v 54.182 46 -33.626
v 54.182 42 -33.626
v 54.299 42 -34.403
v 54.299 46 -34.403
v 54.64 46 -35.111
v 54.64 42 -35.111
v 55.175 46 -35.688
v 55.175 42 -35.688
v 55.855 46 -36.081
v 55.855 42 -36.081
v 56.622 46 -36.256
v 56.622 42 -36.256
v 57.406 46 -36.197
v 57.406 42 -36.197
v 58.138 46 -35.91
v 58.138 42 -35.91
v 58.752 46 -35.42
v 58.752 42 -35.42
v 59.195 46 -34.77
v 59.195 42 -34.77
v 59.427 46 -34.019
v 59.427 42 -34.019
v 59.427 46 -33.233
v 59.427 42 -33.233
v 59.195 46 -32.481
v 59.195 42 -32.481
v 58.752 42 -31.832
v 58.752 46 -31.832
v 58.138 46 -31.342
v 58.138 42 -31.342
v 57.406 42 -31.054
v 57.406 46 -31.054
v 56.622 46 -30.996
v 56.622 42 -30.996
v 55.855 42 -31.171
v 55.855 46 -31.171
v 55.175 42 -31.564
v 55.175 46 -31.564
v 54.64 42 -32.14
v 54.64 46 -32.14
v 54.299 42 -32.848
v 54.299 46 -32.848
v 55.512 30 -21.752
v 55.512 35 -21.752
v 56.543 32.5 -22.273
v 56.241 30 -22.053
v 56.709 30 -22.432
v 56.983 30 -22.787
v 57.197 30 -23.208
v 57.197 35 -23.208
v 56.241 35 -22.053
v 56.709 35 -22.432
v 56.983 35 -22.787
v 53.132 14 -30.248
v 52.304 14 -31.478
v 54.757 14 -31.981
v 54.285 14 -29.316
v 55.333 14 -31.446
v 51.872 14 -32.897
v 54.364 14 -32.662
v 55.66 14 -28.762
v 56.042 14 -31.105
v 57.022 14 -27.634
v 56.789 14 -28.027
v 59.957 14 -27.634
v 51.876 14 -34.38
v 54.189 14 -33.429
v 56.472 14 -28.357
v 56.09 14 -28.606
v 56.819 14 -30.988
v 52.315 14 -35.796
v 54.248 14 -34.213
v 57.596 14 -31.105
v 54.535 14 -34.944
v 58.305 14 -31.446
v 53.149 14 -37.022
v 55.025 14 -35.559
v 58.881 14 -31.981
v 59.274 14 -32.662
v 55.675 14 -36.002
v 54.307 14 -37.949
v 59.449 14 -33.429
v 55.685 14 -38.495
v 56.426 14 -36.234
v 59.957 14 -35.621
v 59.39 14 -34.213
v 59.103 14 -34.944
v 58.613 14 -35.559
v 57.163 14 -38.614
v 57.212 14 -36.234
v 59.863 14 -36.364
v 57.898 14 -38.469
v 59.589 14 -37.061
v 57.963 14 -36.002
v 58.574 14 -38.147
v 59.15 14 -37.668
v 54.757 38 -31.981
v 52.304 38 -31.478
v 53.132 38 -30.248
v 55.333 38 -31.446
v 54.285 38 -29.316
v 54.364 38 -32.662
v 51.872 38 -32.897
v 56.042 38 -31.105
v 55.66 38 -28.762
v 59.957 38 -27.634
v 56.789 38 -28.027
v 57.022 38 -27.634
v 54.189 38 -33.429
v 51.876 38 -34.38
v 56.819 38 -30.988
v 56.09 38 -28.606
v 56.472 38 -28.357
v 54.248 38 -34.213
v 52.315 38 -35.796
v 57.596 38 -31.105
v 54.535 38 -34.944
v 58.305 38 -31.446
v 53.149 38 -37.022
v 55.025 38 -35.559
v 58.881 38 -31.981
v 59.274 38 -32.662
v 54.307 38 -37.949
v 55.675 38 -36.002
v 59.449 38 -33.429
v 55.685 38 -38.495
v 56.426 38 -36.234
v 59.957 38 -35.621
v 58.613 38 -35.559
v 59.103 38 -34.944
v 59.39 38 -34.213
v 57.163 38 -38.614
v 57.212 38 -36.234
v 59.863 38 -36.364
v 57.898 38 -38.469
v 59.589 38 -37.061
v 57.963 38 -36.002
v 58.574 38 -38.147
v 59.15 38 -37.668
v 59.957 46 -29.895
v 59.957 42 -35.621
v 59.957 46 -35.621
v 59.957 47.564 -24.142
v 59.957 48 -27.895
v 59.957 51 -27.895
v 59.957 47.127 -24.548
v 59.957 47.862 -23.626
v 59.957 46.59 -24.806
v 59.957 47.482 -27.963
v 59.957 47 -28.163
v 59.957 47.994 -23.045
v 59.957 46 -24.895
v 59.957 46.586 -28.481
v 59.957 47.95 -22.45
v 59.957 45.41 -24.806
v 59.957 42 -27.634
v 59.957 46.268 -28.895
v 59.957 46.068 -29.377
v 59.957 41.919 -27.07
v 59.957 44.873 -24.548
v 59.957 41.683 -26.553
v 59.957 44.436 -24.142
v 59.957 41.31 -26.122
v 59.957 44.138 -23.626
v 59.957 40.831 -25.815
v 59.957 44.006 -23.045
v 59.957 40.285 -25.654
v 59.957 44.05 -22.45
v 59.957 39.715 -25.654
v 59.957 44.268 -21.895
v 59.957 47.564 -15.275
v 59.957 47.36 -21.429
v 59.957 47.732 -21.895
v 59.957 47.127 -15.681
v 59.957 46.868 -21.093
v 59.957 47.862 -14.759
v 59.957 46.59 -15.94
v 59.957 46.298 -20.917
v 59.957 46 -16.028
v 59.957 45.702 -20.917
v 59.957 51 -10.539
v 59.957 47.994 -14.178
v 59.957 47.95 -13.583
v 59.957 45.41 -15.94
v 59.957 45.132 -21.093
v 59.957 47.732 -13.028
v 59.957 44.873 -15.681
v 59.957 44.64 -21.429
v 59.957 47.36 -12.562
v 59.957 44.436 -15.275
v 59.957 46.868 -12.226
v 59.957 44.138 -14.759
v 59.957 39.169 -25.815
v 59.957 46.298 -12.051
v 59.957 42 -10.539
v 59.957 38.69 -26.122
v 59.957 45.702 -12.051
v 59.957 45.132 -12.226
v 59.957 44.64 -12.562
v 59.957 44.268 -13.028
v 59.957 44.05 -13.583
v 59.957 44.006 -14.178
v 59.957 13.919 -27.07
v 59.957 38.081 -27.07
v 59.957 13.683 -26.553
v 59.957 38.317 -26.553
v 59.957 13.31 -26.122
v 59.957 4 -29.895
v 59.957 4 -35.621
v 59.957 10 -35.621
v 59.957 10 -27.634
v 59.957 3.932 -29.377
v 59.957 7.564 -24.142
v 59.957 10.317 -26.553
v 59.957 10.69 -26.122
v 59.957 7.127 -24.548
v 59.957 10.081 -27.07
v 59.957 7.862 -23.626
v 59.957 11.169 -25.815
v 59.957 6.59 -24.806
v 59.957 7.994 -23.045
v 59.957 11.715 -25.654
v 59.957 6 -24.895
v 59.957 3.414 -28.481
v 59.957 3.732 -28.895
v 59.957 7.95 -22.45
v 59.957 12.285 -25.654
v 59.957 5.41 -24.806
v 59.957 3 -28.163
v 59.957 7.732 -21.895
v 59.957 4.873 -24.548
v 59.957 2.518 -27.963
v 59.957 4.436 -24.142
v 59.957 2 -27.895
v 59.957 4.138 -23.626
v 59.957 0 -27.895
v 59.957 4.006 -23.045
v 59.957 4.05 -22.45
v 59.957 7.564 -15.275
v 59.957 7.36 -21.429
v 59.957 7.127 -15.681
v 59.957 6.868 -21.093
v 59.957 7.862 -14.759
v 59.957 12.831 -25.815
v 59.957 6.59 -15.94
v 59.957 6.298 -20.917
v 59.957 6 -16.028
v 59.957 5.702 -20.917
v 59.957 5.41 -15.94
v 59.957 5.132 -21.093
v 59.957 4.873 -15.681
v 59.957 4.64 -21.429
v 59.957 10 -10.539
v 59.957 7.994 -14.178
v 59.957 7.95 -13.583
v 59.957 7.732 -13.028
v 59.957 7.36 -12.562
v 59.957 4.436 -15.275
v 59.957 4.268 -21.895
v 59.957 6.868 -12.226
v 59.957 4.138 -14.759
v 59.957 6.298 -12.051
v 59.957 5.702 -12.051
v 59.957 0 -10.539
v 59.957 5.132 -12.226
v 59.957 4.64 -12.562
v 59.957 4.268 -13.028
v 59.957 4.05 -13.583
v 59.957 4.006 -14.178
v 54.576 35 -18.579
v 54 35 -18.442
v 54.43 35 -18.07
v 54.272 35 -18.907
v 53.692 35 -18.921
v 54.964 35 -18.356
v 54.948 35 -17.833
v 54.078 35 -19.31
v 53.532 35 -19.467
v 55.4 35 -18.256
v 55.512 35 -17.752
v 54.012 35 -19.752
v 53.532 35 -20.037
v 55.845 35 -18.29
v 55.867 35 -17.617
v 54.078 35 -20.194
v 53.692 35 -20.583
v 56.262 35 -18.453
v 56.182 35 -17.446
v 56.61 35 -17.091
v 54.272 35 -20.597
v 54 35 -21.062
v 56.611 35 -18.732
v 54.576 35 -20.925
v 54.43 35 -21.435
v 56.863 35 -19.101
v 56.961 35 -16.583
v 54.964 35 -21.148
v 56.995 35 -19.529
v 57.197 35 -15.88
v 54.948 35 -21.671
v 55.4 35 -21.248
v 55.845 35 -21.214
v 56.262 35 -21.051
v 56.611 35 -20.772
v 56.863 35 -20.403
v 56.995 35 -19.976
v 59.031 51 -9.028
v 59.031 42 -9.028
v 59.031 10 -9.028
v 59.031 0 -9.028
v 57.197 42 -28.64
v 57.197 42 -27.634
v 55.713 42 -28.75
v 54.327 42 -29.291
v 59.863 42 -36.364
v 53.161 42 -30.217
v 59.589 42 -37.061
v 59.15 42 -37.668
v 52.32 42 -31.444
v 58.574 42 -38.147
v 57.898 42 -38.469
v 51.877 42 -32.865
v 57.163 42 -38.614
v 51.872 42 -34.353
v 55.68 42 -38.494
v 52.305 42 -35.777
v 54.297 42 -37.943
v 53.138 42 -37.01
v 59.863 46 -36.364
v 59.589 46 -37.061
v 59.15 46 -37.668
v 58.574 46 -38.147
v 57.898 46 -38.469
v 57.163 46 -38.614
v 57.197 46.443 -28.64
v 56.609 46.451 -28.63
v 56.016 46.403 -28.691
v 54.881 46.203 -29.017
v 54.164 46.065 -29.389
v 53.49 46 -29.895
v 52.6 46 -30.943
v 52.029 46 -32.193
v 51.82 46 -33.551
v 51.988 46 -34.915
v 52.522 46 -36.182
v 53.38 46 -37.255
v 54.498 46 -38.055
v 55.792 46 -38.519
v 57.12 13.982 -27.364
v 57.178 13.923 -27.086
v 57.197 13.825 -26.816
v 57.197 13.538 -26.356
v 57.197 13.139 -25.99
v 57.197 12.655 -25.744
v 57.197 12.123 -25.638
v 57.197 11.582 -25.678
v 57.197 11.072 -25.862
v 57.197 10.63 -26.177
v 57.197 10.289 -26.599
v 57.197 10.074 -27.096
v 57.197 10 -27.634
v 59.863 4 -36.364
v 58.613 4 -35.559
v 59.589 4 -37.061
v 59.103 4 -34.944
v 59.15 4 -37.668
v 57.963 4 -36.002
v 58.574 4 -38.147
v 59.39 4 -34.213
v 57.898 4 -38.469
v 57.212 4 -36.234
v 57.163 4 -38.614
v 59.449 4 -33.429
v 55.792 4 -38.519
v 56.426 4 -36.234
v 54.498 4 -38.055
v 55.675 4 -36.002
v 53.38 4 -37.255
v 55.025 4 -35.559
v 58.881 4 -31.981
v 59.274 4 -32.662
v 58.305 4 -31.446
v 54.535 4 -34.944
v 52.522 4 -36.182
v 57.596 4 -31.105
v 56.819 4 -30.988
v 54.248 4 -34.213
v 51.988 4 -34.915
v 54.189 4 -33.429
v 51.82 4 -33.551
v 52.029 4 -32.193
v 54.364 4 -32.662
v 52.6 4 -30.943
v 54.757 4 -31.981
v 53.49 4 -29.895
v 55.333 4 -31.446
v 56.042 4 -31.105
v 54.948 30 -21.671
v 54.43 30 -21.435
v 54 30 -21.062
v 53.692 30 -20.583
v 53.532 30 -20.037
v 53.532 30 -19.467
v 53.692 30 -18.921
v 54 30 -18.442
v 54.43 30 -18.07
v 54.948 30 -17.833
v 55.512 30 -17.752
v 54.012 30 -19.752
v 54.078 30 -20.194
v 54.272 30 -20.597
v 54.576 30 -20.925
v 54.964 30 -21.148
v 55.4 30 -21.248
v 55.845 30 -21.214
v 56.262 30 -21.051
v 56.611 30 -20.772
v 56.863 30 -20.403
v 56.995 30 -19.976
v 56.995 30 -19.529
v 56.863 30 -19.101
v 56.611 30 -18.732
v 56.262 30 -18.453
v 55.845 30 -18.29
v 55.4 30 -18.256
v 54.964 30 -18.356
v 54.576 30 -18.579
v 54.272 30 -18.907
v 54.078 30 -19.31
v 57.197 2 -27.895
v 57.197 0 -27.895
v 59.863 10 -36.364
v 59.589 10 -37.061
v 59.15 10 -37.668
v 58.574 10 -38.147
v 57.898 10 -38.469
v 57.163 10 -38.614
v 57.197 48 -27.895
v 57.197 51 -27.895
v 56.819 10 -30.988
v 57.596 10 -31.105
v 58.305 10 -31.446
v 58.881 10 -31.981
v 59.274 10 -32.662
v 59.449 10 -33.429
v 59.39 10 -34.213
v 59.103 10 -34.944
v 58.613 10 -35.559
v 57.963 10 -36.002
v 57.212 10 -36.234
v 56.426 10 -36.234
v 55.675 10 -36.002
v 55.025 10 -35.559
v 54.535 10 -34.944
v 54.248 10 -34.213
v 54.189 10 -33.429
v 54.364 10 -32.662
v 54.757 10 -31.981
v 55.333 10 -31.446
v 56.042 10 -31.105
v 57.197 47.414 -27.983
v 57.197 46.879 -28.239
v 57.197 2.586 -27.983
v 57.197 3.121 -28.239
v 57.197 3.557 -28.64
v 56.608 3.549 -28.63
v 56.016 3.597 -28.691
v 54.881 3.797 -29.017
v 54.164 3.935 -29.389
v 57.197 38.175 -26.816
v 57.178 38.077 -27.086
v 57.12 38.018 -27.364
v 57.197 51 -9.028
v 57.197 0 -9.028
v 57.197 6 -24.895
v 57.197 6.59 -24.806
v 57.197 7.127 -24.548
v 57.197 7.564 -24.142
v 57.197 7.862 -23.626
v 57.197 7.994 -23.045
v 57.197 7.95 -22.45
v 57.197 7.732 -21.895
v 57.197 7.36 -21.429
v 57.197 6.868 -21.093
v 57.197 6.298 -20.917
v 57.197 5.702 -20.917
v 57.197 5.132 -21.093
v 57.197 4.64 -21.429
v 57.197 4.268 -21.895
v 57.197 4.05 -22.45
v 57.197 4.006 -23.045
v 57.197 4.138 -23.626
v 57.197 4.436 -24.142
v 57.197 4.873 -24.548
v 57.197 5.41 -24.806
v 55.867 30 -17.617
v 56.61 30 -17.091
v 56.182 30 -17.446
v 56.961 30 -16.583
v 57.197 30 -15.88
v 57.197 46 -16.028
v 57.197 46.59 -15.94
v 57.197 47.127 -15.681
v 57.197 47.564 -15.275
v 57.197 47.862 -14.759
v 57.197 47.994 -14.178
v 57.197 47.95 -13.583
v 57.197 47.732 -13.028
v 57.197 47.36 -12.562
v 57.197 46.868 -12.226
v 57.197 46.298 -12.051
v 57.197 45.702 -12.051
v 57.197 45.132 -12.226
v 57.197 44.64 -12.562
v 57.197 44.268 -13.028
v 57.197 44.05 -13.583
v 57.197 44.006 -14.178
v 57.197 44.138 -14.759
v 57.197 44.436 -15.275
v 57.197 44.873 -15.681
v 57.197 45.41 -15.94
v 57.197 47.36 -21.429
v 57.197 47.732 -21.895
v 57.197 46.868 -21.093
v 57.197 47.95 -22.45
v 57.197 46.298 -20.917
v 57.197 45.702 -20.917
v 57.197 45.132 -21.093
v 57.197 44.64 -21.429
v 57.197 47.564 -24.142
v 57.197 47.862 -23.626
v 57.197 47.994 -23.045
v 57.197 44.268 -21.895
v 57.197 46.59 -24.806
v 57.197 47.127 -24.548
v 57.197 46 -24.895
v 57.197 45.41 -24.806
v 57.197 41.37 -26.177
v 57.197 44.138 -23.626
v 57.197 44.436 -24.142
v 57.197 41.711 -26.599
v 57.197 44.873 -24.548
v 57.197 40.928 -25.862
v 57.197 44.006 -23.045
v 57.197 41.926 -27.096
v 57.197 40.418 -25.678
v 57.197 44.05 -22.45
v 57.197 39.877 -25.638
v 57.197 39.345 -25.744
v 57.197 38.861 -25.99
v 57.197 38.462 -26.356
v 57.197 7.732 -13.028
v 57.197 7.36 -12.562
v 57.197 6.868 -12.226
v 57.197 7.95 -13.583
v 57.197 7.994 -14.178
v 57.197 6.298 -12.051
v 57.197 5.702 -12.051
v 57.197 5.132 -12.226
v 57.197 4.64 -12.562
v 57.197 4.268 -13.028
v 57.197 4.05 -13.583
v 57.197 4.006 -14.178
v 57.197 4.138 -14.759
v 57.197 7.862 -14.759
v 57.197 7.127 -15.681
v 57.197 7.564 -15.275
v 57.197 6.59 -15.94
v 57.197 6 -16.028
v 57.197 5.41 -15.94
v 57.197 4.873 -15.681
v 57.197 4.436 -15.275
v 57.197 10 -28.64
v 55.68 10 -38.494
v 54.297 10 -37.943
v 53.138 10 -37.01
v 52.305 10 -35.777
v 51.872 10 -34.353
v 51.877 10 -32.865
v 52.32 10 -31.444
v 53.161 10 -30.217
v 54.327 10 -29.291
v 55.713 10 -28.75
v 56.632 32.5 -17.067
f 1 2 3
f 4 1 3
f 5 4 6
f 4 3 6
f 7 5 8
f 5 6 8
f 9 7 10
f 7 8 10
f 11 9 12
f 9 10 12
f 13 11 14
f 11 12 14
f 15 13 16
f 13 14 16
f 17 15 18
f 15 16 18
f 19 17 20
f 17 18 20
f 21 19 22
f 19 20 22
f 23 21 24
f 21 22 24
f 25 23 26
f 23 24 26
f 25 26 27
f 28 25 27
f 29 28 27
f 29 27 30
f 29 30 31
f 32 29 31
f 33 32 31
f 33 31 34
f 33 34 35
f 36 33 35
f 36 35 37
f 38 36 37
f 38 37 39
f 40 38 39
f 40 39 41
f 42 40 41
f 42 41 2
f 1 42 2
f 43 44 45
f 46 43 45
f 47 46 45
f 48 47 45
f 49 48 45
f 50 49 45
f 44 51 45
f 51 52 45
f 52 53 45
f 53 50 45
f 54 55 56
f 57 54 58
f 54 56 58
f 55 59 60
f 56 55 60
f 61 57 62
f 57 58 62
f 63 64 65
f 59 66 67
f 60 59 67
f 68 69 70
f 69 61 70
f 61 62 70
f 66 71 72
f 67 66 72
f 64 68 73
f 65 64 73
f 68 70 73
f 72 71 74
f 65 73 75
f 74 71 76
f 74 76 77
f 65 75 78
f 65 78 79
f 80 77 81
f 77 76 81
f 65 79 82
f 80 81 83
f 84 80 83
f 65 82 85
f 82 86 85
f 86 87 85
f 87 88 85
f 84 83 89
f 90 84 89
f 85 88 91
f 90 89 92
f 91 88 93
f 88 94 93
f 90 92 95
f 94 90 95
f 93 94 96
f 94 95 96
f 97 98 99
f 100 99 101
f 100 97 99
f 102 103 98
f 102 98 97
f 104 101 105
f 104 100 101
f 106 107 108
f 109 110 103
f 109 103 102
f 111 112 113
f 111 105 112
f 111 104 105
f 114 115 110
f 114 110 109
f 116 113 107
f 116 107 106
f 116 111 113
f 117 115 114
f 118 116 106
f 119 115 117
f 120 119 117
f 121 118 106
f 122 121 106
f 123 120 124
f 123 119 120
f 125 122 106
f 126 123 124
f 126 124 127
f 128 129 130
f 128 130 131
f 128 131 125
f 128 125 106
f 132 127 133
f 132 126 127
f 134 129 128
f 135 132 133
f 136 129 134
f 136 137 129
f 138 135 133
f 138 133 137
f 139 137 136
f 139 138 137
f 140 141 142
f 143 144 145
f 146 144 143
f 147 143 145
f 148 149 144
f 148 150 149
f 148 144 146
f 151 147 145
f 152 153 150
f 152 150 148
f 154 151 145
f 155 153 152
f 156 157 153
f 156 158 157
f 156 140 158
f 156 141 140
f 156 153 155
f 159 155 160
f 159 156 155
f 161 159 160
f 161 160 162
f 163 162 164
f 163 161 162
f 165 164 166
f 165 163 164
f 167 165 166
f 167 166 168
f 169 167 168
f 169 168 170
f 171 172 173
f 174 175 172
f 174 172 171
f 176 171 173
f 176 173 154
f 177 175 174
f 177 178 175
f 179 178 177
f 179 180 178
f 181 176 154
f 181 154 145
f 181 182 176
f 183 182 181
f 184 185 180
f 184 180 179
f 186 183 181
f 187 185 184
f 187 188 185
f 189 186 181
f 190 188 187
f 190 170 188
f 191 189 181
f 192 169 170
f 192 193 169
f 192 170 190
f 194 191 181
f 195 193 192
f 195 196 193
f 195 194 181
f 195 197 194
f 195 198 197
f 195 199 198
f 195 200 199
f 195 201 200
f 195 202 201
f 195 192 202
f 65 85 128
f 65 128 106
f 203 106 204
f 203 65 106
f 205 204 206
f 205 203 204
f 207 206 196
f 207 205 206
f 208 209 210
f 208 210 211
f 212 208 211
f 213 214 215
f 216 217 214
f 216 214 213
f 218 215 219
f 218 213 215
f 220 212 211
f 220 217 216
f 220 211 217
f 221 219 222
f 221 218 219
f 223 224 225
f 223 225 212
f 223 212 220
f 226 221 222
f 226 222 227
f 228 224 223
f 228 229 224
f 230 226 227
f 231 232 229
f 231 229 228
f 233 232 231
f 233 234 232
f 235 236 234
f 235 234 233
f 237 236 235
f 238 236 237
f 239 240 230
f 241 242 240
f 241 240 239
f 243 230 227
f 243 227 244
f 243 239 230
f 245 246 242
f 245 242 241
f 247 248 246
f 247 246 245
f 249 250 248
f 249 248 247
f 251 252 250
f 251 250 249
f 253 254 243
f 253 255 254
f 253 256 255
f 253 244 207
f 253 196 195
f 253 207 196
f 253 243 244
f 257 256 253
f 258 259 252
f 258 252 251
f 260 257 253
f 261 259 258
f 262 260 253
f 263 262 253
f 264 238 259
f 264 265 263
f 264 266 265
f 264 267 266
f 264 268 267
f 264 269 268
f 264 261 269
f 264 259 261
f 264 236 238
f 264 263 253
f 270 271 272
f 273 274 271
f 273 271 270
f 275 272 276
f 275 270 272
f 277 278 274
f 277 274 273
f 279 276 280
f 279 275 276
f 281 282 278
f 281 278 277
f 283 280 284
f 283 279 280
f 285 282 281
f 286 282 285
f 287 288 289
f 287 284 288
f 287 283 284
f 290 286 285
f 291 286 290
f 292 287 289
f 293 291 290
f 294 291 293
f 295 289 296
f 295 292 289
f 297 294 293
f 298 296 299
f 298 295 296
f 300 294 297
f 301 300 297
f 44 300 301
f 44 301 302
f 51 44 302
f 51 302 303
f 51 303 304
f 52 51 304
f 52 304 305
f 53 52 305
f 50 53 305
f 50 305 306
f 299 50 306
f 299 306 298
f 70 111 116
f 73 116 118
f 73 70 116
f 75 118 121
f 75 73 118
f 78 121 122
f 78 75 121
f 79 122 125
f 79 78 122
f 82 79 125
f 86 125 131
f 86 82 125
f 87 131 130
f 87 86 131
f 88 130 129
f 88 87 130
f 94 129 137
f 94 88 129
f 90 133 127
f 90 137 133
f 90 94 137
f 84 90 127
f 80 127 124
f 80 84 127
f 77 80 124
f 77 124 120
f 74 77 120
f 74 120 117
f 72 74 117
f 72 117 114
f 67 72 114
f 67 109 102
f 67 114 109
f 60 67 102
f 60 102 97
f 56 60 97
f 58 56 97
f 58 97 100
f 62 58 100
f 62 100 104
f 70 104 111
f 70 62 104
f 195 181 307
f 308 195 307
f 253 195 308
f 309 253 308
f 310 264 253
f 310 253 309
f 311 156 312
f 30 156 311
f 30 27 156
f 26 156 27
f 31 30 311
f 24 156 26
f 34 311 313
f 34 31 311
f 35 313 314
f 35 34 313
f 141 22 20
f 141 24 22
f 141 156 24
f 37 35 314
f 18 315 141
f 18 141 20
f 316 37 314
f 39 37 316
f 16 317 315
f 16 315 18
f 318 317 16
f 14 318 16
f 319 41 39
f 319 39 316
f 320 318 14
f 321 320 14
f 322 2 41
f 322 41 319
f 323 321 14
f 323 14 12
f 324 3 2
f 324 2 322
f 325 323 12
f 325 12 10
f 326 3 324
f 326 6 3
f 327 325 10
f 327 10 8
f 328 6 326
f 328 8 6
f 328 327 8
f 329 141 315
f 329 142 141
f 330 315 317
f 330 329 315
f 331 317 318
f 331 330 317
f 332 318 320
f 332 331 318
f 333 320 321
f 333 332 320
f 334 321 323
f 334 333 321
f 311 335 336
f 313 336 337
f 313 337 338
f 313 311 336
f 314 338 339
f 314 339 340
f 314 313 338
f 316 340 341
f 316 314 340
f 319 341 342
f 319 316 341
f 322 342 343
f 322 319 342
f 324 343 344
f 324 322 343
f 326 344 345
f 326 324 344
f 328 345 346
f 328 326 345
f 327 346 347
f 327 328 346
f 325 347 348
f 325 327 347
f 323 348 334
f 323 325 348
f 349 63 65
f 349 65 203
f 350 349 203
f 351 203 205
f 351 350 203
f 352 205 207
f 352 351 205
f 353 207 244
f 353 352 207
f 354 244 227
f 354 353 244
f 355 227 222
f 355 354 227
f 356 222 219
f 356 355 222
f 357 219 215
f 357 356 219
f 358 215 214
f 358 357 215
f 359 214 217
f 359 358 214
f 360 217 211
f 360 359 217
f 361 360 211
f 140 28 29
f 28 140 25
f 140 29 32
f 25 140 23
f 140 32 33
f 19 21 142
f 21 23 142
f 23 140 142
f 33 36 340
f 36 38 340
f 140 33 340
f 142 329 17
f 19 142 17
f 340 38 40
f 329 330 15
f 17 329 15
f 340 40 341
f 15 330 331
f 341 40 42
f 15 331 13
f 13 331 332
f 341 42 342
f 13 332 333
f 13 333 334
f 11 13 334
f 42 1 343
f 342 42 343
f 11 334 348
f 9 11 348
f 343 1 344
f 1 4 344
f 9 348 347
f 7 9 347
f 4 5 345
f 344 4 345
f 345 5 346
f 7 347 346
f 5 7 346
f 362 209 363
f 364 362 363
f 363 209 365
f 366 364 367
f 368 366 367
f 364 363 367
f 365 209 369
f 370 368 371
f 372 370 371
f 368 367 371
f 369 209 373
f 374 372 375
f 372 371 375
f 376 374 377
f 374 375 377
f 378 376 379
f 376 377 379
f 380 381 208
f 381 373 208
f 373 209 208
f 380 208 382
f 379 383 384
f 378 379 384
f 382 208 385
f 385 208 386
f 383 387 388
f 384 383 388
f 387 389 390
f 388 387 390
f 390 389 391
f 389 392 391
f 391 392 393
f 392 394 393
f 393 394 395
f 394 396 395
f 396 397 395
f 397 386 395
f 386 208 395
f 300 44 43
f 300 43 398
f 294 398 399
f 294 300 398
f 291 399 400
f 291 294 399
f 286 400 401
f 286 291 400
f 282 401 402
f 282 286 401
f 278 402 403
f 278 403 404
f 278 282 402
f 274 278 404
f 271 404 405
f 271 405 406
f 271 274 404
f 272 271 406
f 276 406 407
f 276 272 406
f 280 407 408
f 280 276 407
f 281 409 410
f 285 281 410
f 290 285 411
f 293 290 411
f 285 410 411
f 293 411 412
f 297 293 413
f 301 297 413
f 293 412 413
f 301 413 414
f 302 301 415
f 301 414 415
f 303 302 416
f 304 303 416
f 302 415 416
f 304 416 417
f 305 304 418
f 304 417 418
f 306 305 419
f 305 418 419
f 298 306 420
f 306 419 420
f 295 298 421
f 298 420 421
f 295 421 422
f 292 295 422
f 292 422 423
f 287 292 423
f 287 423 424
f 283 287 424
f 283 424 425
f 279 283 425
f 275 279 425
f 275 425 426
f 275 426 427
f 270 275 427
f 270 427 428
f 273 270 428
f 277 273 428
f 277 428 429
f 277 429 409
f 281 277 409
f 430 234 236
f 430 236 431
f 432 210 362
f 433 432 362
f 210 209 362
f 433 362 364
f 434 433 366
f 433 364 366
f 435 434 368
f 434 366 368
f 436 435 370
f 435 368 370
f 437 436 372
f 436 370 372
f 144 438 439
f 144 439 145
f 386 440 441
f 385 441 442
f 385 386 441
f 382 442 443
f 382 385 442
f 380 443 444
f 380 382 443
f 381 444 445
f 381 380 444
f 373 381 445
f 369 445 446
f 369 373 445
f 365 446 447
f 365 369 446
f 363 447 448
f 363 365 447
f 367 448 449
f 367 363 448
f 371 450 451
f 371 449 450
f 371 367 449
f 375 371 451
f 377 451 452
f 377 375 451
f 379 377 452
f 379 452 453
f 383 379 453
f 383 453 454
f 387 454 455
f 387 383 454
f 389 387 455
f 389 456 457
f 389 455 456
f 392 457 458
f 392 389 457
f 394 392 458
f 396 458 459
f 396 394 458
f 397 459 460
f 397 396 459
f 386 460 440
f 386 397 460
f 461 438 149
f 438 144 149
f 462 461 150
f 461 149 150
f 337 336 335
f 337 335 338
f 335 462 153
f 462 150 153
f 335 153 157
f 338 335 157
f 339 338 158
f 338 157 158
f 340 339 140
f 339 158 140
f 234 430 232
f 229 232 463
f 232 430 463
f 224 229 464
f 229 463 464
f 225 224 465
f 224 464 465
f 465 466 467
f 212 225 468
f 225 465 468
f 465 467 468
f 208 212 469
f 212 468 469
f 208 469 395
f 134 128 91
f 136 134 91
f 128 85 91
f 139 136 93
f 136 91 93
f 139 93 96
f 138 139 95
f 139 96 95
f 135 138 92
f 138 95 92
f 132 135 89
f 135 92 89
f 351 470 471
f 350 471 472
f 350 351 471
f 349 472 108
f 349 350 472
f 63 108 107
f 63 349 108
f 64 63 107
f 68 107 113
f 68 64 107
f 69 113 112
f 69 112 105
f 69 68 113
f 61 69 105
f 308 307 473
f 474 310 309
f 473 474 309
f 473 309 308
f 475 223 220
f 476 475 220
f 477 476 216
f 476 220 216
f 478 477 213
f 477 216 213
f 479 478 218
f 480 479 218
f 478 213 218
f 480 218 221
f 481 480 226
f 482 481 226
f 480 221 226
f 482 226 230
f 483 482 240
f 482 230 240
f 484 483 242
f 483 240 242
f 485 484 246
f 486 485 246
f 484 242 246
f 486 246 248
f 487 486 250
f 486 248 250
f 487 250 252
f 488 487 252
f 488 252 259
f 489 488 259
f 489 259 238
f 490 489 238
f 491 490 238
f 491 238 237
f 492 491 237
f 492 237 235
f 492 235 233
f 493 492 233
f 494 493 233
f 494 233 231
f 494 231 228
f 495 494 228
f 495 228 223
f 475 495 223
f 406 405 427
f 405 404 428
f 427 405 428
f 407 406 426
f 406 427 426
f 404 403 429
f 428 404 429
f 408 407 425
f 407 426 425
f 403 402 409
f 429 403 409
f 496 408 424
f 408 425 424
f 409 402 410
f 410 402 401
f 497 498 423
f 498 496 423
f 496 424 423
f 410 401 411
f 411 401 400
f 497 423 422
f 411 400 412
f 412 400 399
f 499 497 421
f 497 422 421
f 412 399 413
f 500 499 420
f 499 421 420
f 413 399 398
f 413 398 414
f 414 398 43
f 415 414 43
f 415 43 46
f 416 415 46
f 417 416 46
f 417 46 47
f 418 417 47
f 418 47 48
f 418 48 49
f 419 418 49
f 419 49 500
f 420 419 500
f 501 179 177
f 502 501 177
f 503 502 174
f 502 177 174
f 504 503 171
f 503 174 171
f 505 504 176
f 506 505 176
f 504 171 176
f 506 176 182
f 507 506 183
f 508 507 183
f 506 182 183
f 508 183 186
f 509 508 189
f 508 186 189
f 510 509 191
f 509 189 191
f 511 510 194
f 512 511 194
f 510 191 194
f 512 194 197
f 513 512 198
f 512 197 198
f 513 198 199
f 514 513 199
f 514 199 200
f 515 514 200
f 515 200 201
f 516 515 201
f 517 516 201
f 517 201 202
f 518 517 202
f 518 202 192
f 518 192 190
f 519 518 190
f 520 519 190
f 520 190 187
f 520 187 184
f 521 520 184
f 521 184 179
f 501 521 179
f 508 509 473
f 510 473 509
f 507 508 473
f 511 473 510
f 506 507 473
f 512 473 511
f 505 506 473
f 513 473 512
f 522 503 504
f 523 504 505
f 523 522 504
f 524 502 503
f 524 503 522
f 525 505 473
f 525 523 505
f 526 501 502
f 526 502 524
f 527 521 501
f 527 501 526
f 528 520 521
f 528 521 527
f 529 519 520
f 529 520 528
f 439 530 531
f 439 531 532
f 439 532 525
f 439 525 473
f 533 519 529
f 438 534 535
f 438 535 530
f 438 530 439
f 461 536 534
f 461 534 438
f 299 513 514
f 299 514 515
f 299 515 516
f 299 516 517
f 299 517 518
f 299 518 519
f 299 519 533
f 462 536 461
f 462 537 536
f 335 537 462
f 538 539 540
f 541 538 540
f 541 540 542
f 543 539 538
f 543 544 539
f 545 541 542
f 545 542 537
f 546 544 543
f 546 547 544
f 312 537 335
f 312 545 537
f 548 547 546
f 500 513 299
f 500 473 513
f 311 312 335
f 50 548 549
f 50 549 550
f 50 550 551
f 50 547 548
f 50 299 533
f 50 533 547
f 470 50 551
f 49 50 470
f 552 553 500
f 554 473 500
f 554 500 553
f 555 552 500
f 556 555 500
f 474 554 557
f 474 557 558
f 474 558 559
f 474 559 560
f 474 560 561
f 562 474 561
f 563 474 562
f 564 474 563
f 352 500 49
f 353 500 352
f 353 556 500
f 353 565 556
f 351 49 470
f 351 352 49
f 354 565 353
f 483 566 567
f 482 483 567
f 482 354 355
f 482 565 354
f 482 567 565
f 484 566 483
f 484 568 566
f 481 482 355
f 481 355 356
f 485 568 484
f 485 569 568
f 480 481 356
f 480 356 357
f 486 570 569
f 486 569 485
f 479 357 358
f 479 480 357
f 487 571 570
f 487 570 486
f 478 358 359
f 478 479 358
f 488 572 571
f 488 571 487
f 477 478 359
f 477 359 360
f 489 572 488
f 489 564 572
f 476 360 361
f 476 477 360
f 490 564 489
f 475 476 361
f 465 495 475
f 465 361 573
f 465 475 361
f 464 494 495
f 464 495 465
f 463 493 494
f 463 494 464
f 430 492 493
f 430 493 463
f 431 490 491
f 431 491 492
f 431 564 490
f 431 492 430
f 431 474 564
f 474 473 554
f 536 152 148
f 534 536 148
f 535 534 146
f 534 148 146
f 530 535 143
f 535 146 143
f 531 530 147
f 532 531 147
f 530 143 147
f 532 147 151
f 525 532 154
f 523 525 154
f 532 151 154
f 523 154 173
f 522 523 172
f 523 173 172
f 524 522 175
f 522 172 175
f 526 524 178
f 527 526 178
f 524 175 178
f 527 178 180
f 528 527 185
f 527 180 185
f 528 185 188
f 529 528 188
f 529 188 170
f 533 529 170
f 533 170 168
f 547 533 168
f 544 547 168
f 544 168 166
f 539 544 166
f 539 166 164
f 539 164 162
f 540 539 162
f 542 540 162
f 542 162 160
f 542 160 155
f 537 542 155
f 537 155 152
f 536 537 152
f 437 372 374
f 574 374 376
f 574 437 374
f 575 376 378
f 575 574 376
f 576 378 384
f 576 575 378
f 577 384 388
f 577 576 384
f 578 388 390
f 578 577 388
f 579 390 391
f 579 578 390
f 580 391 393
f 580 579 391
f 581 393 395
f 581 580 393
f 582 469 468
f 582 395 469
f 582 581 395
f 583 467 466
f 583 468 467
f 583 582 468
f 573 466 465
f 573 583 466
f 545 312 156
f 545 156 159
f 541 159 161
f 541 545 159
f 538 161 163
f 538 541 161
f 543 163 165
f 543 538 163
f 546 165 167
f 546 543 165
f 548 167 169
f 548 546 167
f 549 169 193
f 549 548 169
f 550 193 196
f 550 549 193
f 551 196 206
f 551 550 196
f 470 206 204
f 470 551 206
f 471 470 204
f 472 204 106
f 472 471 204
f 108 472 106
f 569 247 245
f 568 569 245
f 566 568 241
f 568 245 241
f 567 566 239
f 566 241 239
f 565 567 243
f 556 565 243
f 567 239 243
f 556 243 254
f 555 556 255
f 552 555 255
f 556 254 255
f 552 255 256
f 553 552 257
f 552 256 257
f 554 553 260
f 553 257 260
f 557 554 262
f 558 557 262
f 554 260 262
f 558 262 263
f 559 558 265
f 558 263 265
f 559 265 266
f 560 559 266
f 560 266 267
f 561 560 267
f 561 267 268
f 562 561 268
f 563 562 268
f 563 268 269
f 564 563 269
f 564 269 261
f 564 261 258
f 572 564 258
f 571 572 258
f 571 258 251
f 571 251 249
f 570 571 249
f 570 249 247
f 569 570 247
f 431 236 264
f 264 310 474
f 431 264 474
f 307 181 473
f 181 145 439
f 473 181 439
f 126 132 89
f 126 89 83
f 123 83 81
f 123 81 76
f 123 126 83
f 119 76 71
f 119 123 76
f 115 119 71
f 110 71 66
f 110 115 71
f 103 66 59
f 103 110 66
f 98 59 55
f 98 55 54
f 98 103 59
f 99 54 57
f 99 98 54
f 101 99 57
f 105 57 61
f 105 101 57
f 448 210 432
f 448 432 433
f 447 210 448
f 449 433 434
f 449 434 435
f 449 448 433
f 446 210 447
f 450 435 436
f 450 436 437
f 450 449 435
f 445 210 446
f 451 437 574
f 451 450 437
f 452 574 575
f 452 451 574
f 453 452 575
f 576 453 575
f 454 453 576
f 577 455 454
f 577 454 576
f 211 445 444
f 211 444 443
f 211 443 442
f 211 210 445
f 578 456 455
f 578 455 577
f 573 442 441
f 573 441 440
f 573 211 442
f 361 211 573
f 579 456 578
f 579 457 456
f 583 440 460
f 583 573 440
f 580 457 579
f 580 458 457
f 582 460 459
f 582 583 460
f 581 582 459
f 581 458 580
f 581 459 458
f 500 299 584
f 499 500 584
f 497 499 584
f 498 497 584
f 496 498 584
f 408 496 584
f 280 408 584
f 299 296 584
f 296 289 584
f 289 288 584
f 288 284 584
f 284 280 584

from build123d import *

# Parameters (mm, degrees)
BOSS_EXTRUDE5_DEPTH          = 2.760049195
CHAMFER1_SIZE                = 1.510362865
CHAMFER1_SIZE2               = 0.926037145
BOSS_EXTRUDE6_DEPTH          = 24
BOSS_EXTRUDE7_DEPTH          = 5
BOSS_EXTRUDE8_DEPTH          = 6
BOSS_EXTRUDE9_DEPTH          = 4
SKETCH28_W                   = 2.760049196
SKETCH28_H                   = 4
CUT_EXTRUDE3_DEPTH           = 8.878692186
BOSS_EXTRUDE10_DEPTH         = 4
SKETCH45_W                   = 2.760049196
SKETCH45_H                   = 4
CUT_EXTRUDE4_DEPTH           = 0.7448337
BOSS_EXTRUDE11_DEPTH         = 5
F_4_0_4_DIAMETER_HOLE2_D     = 4
F_4_0_4_DIAMETER_HOLE2_DEPTH = 2.760049195
SKETCH58_W                   = 2.6375
SKETCH58_H                   = 10
SKETCH60_W                   = 2.6375
SKETCH60_H                   = 38
HOLE6_D                      = 5.275
HOLE6_DEPTH                  = 46
F_3_0_3_DIAMETER_HOLE2_D     = 3
F_3_0_3_DIAMETER_HOLE2_DEPTH = 35
FILLET3_R                    = 2
FILLET4_R                    = 3


with BuildPart() as part:
    # Sketch17 → Boss-Extrude5 (new body)
    with BuildSketch(Plane(origin=(57.196631886, 0, 0), x_dir=(0, -1, 0), z_dir=(-1, 0, 0))):
        with BuildLine():
            Line((-38, -27.633835998), (-14, -27.633835998))
            ThreePointArc((-14, -27.633835998), (-12, -25.633835998), (-10, -27.633835998))
            Line((-10, -27.633835998), (-10, -9.028355512))
            Line((-10, -9.028355512), (-42, -9.028355512))
            Line((-42, -9.028355512), (-42, -27.633835998))
            ThreePointArc((-42, -27.633835998), (-40, -25.633835998), (-38, -27.633835998))
        make_face()
    extrude(amount=-BOSS_EXTRUDE5_DEPTH)

    # Chamfer1
    chamfer1_edges = [part.edges().sort_by_distance(p)[0] for p in [
        (59.956681082, 26, -9.028355512),
    ]]
    chamfer1_side = [part.faces().sort_by_distance(p)[0] for p in [
        (59.956681082, 26, -18.148814744),
    ]]
    chamfer(chamfer1_edges, length=CHAMFER1_SIZE, length2=CHAMFER1_SIZE2, reference=chamfer1_side[0])

    # Sketch18 → Boss-Extrude6 (add)
    with BuildSketch(Plane(origin=(0, 38, 0), x_dir=(1, 0, 0), z_dir=(0, 1, 0))):
        with BuildLine():
            Line((57.196631886, 27.633835998), (59.956681082, 27.633835998))
            Line((59.956681082, 27.633835998), (59.956681082, 37.518663649))
            ThreePointArc((59.956681082, 37.518663649), (52.044420209, 35.109942461), (57.196631886, 28.639971463))
            Line((57.196631886, 28.639971463), (57.196631886, 27.633835998))
        make_face()
    extrude(amount=-BOSS_EXTRUDE6_DEPTH)

    # Sketch19 → Boss-Extrude7 (add)
    with BuildSketch(Plane(origin=(0, 35, 0), x_dir=(1, 0, 0), z_dir=(0, 1, 0))):
        with BuildLine():
            Line((57.196631886, 15.88036097), (57.196631886, 23.207838196))
            add(Edge.make_bspline(
                [(55.511713205, 21.752088745), (56.732163203, 22.065636669), (57.196631886, 23.207838196)],
                knots=[0, 0, 0, 1, 1, 1], degree=2))
            ThreePointArc((55.511713205, 21.752088745), (53.511713205, 19.752088745), (55.511713205, 17.752088745))
            add(Edge.make_bspline(
                [(57.196631886, 15.88036097), (56.909946197, 17.31678815), (55.511713205, 17.752088745)],
                knots=[0, 0, 0, 1, 1, 1], degree=2))
        make_face()
    extrude(amount=-BOSS_EXTRUDE7_DEPTH)

    # Sketch20 → Boss-Extrude8 (add)
    with BuildSketch(Plane.XZ.offset(-10)):
        with BuildLine():
            Line((57.196631886, -28.639971463), (57.196631886, -9.028355512))
            Line((57.196631886, -9.028355512), (59.030643937, -9.028355512))
            Line((59.030643937, -9.028355512), (59.956681082, -10.538718377))
            Line((59.956681082, -10.538718377), (59.956681082, -37.518663649))
            ThreePointArc((59.956681082, -37.518663649), (52.044420209, -35.109942461), (57.196631886, -28.639971463))
        make_face()
    extrude(amount=BOSS_EXTRUDE8_DEPTH)

    # Sketch21 → Boss-Extrude9 (add)
    with BuildSketch(Plane.XZ.offset(-4)):
        Polygon((57.196631886, -27.895137764), (57.196631886, -9.028355512), (59.030643937, -9.028355512), (59.956681082, -10.538718377), (59.956681082, -27.895137764), (59.956681082, -28.639971463), (59.956681082, -37.518663649), (57.196631886, -37.518663649), (57.196631886, -28.639971463), align=None)
    extrude(amount=BOSS_EXTRUDE9_DEPTH)

    # Sketch28 → Cut-Extrude3 (cut)
    with BuildSketch(Plane(origin=(0, 0, -37.518663649), x_dir=(-1, 0, 0), z_dir=(0, 0, -1))):
        with Locations((-58.576656484, 2)):
            Rectangle(SKETCH28_W, SKETCH28_H)
    extrude(amount=-CUT_EXTRUDE3_DEPTH, mode=Mode.SUBTRACT)

    # Sketch36 → Boss-Extrude10 (add)
    with BuildSketch(Plane(origin=(0, 42, 0), x_dir=(1, 0, 0), z_dir=(0, 1, 0))):
        with BuildLine():
            Line((59.956681082, 37.518663649), (59.956681082, 10.538718377))
            Line((59.956681082, 10.538718377), (59.030643937, 9.028355512))
            Line((59.030643937, 9.028355512), (57.196631886, 9.028355512))
            Line((57.196631886, 9.028355512), (57.196631886, 28.639971463))
            ThreePointArc((57.196631886, 28.639971463), (52.044420209, 35.109942461), (59.956681082, 37.518663649))
        make_face()
    extrude(amount=BOSS_EXTRUDE10_DEPTH)

    # Sketch45 → Cut-Extrude4 (cut)
    with BuildSketch(Plane(origin=(0, 0, -28.639971463), x_dir=(-1, 0, 0), z_dir=(0, 0, -1))):
        with Locations((-58.576656484, 2)):
            Rectangle(SKETCH45_W, SKETCH45_H)
    extrude(amount=-CUT_EXTRUDE4_DEPTH, mode=Mode.SUBTRACT)

    # Sketch55 → Boss-Extrude11 (add)
    with BuildSketch(Plane(origin=(0, 46, 0), x_dir=(1, 0, 0), z_dir=(0, 1, 0))):
        Polygon((59.956681082, 10.538718377), (59.030643937, 9.028355512), (57.196631886, 9.028355512), (57.196631886, 27.895137764), (59.956681082, 27.895137764), align=None)
    extrude(amount=BOSS_EXTRUDE11_DEPTH)

    # Ø4.0 (4) Diameter Hole2
    with Locations(Plane.ZY.offset(-57.196631886)):
        with Locations((-22.895137764, 6), (-14.028355512, 6), (-14.028355512, 46), (-22.895137764, 46)):
            Hole(F_4_0_4_DIAMETER_HOLE2_D / 2, depth=F_4_0_4_DIAMETER_HOLE2_DEPTH)

    # Sketch58 → Hole4 (revolve, cut)
    with BuildSketch(Plane(origin=(56.81904117, 10, -33.625693603), x_dir=(0, 0, 1), z_dir=(1, 0, 0))):
        with Locations((1.31875, 5)):
            Rectangle(SKETCH58_W, SKETCH58_H)
    revolve(axis=Axis((56.81904117, -100, -33.625693603), (0, 1, 0)), mode=Mode.SUBTRACT)

    # Sketch60 → Hole5 (revolve, cut)
    with BuildSketch(Plane(origin=(56.81904117, 38, -33.625693603), x_dir=(0, 0, 1), z_dir=(1, 0, 0))):
        with Locations((1.31875, 19)):
            Rectangle(SKETCH60_W, SKETCH60_H)
    revolve(axis=Axis((56.81904117, -72, -33.625693603), (0, 1, 0)), mode=Mode.SUBTRACT)

    # Hole6
    with Locations(Plane(origin=(0, 46, 0), x_dir=(1, 0, 0), z_dir=(0, 1, 0))):
        with Locations((56.81904117, 33.625693603)):
            Hole(HOLE6_D / 2, depth=HOLE6_DEPTH)

    # Ø3.0 (3) Diameter Hole2
    with Locations(Plane(origin=(0, 35, 0), x_dir=(1, 0, 0), z_dir=(0, 1, 0))):
        with Locations((55.511713205, 19.752088745)):
            Hole(F_3_0_3_DIAMETER_HOLE2_D / 2, depth=F_3_0_3_DIAMETER_HOLE2_DEPTH)

    # Fillet3
    fillet3_edges = [part.edges().sort_by_distance(p)[0] for p in [
        (58.576656484, 46, -27.895137764),
        (58.576656484, 4, -27.895137764),
        (57.196631886, 26, -28.639971463),
    ]]
    fillet(fillet3_edges, radius=FILLET3_R)

    # Fillet4
    fillet4_edges = [part.edges().sort_by_distance(p)[0] for p in [
        (59.956681082, 26, -37.518663649),
        (59.956681082, 7, -37.518663649),
        (59.956681082, 44, -37.518663649),
    ]]
    fillet(fillet4_edges, radius=FILLET4_R)


solid = part.part
